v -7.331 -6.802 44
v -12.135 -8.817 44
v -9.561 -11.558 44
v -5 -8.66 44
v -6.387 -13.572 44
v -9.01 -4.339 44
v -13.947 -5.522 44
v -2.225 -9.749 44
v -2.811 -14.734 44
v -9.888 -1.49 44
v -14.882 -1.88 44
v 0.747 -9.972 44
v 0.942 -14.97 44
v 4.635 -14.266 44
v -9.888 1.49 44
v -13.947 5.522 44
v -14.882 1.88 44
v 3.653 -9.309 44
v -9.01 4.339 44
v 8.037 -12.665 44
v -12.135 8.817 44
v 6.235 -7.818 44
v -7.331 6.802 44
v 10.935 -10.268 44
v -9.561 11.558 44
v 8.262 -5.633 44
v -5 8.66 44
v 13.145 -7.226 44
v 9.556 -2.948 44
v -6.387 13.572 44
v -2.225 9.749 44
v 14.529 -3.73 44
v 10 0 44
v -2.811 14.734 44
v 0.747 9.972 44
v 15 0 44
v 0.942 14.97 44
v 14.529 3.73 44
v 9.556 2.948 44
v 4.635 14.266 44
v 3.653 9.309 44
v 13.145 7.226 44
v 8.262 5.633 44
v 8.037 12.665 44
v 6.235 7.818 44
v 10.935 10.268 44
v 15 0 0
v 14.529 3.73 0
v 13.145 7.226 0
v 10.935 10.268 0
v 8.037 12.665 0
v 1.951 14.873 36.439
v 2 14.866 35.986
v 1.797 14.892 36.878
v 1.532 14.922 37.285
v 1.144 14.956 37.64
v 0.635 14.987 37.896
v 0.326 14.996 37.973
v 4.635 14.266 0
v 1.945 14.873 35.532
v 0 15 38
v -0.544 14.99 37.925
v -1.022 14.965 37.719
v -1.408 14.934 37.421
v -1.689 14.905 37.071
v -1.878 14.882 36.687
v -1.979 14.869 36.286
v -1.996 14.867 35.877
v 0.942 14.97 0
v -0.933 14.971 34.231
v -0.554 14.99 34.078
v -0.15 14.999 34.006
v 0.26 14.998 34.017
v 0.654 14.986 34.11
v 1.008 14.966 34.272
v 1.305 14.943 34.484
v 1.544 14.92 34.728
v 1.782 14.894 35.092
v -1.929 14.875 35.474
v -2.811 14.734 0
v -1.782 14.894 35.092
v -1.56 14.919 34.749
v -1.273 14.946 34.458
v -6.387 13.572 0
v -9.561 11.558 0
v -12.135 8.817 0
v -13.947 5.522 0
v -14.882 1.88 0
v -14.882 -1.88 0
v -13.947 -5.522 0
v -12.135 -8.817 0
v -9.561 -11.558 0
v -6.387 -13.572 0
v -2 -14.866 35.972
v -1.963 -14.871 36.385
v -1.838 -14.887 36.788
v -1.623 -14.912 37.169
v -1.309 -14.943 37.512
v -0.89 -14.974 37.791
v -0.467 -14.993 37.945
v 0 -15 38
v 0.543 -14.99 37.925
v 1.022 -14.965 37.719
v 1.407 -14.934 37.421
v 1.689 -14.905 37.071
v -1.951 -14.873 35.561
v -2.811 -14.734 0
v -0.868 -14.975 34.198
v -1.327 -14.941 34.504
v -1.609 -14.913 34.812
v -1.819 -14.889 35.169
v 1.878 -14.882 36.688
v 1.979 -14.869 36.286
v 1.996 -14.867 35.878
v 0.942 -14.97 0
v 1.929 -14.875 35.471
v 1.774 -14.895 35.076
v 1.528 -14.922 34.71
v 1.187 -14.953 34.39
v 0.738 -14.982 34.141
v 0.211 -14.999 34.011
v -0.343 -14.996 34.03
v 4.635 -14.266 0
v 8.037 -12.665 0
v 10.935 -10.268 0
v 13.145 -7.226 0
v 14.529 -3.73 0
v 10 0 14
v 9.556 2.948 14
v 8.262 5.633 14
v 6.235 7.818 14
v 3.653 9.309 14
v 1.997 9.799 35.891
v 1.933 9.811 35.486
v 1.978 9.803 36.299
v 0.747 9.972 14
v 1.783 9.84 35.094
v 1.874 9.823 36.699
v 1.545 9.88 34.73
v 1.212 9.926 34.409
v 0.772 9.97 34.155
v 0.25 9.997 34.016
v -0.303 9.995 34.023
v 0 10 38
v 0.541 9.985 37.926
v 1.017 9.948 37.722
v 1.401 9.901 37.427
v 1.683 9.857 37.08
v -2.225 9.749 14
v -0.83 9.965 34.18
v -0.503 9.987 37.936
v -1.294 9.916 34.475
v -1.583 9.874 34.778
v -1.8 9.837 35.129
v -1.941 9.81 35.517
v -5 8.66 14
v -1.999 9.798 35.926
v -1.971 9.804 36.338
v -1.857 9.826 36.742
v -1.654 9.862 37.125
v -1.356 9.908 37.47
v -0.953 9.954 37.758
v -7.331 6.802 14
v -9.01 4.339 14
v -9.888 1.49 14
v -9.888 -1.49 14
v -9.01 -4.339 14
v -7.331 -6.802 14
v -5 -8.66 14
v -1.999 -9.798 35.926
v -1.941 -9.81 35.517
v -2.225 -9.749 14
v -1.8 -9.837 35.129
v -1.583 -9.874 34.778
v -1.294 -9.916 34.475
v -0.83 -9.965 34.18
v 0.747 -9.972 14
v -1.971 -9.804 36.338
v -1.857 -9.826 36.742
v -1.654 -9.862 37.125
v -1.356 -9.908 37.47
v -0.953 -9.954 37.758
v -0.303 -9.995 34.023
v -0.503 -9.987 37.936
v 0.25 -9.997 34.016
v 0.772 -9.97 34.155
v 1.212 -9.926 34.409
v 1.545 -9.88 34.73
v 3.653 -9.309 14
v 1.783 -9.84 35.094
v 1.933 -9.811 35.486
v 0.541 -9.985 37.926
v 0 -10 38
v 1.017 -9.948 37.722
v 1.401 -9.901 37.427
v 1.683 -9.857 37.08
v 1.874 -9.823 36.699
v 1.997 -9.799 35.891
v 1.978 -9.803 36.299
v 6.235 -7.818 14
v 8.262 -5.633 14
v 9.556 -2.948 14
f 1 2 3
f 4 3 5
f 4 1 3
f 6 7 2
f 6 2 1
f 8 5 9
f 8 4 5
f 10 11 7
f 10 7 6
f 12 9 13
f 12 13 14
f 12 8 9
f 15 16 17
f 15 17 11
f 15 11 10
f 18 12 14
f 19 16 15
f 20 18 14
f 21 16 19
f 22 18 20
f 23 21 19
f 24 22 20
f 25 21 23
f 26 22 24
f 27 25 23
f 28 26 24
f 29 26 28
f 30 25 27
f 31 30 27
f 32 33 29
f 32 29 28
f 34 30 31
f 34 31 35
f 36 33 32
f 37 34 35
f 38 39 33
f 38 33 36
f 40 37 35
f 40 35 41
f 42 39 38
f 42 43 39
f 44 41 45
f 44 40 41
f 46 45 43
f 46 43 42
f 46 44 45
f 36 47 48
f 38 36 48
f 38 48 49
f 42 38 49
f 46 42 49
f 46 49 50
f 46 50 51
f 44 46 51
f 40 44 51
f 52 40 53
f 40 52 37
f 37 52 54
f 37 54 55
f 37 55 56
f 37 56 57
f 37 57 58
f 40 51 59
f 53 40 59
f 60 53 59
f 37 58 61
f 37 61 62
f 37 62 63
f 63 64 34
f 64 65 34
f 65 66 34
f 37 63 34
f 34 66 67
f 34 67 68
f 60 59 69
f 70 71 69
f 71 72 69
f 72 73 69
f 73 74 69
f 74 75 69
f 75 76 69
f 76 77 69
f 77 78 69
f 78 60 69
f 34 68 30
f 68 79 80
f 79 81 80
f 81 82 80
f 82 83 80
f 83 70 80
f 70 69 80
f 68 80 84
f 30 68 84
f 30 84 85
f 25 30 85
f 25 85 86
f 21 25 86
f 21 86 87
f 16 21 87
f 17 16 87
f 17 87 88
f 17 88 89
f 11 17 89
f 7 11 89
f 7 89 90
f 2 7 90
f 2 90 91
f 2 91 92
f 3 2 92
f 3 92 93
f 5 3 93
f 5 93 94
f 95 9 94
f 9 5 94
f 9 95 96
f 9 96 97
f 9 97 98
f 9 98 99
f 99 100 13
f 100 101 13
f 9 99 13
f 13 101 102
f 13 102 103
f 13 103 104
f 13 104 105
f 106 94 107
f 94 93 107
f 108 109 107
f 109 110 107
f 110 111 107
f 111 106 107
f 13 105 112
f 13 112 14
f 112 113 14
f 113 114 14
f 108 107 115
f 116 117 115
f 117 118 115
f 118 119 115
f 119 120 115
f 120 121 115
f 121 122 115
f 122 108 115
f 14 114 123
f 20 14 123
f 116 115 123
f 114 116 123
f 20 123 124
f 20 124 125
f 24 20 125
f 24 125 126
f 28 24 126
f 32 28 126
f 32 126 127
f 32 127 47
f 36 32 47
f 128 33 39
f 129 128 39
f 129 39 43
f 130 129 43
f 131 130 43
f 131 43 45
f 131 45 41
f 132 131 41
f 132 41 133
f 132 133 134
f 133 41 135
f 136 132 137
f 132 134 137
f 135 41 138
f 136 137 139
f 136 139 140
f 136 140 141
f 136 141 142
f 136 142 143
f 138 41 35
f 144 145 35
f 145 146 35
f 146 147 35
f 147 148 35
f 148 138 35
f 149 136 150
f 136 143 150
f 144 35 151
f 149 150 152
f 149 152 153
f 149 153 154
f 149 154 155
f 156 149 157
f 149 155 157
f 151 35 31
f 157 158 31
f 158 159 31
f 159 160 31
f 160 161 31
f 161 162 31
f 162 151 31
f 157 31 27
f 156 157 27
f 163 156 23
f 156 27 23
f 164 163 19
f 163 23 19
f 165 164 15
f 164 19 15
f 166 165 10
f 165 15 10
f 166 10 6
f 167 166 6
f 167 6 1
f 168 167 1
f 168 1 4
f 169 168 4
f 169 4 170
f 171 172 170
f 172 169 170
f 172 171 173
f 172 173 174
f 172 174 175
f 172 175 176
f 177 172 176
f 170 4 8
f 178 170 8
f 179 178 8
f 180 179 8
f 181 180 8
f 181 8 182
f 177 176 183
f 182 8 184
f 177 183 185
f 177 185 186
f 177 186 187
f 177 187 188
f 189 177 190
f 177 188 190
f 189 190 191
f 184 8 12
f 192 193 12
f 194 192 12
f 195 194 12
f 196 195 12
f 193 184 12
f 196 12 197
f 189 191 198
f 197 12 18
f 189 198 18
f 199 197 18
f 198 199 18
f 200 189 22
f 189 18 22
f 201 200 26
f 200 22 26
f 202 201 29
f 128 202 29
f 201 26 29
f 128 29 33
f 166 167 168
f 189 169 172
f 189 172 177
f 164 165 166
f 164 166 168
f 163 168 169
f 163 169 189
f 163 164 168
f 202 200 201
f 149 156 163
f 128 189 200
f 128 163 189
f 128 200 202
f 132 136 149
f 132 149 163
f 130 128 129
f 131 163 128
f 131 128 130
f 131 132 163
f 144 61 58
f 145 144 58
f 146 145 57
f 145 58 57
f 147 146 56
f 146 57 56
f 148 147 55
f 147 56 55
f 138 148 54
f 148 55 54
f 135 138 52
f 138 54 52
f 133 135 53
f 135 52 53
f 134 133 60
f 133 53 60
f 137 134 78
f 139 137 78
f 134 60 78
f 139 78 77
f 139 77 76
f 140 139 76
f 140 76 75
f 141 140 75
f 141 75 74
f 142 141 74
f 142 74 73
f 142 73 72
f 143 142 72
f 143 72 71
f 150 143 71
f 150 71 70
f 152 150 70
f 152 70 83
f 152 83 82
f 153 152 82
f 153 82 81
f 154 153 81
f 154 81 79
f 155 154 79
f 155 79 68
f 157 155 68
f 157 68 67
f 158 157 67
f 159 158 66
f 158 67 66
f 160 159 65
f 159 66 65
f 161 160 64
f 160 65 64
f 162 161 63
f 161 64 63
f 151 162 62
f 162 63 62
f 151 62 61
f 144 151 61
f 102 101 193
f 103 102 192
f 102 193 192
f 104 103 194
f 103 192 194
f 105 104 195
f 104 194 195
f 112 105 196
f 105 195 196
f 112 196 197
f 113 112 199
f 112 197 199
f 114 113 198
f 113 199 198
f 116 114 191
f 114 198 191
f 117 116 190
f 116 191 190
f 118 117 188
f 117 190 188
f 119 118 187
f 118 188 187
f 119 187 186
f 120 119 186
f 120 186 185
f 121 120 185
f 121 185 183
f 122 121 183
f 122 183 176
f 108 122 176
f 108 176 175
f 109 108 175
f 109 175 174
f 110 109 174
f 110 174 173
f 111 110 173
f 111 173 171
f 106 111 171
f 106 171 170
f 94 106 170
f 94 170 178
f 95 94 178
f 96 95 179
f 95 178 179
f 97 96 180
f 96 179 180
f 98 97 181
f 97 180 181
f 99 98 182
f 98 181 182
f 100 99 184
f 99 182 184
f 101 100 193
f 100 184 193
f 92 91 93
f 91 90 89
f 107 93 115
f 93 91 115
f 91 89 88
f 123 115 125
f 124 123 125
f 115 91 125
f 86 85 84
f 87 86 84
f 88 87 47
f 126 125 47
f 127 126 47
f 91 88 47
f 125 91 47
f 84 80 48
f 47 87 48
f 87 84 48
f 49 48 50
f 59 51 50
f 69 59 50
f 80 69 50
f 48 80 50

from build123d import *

# Parameters (mm, degrees)
IZIM1_R                     = 15
Y_KSEKLIK_EKSTR_ZYON1_DEPTH = 44
IZIM3_R                     = 10
KES_EKSTR_ZYON1_DEPTH       = 30
IZIM4_R                     = 2
KES_EKSTR_ZYON2_DEPTH       = 60


with BuildPart() as part:
    # Çizim1 → Yükseklik-Ekstrüzyon1 (new body)
    with BuildSketch(Plane.XY):
        Circle(IZIM1_R)
    extrude(amount=Y_KSEKLIK_EKSTR_ZYON1_DEPTH)

    # Çizim3 → Kes-Ekstrüzyon1 (cut)
    with BuildSketch(Plane.XY.offset(44)):
        Circle(IZIM3_R)
    extrude(amount=-KES_EKSTR_ZYON1_DEPTH, mode=Mode.SUBTRACT)

    # Çizim4 → Kes-Ekstrüzyon2 (cut)
    with BuildSketch(Plane(origin=(0, 15, 0), x_dir=(1, 0, 0), z_dir=(0, 1, 0))):
        with Locations(Location((0, -36, 0), (0, 0, 270))):
            Circle(IZIM4_R)
    extrude(amount=-KES_EKSTR_ZYON2_DEPTH, mode=Mode.SUBTRACT)


solid = part.part
